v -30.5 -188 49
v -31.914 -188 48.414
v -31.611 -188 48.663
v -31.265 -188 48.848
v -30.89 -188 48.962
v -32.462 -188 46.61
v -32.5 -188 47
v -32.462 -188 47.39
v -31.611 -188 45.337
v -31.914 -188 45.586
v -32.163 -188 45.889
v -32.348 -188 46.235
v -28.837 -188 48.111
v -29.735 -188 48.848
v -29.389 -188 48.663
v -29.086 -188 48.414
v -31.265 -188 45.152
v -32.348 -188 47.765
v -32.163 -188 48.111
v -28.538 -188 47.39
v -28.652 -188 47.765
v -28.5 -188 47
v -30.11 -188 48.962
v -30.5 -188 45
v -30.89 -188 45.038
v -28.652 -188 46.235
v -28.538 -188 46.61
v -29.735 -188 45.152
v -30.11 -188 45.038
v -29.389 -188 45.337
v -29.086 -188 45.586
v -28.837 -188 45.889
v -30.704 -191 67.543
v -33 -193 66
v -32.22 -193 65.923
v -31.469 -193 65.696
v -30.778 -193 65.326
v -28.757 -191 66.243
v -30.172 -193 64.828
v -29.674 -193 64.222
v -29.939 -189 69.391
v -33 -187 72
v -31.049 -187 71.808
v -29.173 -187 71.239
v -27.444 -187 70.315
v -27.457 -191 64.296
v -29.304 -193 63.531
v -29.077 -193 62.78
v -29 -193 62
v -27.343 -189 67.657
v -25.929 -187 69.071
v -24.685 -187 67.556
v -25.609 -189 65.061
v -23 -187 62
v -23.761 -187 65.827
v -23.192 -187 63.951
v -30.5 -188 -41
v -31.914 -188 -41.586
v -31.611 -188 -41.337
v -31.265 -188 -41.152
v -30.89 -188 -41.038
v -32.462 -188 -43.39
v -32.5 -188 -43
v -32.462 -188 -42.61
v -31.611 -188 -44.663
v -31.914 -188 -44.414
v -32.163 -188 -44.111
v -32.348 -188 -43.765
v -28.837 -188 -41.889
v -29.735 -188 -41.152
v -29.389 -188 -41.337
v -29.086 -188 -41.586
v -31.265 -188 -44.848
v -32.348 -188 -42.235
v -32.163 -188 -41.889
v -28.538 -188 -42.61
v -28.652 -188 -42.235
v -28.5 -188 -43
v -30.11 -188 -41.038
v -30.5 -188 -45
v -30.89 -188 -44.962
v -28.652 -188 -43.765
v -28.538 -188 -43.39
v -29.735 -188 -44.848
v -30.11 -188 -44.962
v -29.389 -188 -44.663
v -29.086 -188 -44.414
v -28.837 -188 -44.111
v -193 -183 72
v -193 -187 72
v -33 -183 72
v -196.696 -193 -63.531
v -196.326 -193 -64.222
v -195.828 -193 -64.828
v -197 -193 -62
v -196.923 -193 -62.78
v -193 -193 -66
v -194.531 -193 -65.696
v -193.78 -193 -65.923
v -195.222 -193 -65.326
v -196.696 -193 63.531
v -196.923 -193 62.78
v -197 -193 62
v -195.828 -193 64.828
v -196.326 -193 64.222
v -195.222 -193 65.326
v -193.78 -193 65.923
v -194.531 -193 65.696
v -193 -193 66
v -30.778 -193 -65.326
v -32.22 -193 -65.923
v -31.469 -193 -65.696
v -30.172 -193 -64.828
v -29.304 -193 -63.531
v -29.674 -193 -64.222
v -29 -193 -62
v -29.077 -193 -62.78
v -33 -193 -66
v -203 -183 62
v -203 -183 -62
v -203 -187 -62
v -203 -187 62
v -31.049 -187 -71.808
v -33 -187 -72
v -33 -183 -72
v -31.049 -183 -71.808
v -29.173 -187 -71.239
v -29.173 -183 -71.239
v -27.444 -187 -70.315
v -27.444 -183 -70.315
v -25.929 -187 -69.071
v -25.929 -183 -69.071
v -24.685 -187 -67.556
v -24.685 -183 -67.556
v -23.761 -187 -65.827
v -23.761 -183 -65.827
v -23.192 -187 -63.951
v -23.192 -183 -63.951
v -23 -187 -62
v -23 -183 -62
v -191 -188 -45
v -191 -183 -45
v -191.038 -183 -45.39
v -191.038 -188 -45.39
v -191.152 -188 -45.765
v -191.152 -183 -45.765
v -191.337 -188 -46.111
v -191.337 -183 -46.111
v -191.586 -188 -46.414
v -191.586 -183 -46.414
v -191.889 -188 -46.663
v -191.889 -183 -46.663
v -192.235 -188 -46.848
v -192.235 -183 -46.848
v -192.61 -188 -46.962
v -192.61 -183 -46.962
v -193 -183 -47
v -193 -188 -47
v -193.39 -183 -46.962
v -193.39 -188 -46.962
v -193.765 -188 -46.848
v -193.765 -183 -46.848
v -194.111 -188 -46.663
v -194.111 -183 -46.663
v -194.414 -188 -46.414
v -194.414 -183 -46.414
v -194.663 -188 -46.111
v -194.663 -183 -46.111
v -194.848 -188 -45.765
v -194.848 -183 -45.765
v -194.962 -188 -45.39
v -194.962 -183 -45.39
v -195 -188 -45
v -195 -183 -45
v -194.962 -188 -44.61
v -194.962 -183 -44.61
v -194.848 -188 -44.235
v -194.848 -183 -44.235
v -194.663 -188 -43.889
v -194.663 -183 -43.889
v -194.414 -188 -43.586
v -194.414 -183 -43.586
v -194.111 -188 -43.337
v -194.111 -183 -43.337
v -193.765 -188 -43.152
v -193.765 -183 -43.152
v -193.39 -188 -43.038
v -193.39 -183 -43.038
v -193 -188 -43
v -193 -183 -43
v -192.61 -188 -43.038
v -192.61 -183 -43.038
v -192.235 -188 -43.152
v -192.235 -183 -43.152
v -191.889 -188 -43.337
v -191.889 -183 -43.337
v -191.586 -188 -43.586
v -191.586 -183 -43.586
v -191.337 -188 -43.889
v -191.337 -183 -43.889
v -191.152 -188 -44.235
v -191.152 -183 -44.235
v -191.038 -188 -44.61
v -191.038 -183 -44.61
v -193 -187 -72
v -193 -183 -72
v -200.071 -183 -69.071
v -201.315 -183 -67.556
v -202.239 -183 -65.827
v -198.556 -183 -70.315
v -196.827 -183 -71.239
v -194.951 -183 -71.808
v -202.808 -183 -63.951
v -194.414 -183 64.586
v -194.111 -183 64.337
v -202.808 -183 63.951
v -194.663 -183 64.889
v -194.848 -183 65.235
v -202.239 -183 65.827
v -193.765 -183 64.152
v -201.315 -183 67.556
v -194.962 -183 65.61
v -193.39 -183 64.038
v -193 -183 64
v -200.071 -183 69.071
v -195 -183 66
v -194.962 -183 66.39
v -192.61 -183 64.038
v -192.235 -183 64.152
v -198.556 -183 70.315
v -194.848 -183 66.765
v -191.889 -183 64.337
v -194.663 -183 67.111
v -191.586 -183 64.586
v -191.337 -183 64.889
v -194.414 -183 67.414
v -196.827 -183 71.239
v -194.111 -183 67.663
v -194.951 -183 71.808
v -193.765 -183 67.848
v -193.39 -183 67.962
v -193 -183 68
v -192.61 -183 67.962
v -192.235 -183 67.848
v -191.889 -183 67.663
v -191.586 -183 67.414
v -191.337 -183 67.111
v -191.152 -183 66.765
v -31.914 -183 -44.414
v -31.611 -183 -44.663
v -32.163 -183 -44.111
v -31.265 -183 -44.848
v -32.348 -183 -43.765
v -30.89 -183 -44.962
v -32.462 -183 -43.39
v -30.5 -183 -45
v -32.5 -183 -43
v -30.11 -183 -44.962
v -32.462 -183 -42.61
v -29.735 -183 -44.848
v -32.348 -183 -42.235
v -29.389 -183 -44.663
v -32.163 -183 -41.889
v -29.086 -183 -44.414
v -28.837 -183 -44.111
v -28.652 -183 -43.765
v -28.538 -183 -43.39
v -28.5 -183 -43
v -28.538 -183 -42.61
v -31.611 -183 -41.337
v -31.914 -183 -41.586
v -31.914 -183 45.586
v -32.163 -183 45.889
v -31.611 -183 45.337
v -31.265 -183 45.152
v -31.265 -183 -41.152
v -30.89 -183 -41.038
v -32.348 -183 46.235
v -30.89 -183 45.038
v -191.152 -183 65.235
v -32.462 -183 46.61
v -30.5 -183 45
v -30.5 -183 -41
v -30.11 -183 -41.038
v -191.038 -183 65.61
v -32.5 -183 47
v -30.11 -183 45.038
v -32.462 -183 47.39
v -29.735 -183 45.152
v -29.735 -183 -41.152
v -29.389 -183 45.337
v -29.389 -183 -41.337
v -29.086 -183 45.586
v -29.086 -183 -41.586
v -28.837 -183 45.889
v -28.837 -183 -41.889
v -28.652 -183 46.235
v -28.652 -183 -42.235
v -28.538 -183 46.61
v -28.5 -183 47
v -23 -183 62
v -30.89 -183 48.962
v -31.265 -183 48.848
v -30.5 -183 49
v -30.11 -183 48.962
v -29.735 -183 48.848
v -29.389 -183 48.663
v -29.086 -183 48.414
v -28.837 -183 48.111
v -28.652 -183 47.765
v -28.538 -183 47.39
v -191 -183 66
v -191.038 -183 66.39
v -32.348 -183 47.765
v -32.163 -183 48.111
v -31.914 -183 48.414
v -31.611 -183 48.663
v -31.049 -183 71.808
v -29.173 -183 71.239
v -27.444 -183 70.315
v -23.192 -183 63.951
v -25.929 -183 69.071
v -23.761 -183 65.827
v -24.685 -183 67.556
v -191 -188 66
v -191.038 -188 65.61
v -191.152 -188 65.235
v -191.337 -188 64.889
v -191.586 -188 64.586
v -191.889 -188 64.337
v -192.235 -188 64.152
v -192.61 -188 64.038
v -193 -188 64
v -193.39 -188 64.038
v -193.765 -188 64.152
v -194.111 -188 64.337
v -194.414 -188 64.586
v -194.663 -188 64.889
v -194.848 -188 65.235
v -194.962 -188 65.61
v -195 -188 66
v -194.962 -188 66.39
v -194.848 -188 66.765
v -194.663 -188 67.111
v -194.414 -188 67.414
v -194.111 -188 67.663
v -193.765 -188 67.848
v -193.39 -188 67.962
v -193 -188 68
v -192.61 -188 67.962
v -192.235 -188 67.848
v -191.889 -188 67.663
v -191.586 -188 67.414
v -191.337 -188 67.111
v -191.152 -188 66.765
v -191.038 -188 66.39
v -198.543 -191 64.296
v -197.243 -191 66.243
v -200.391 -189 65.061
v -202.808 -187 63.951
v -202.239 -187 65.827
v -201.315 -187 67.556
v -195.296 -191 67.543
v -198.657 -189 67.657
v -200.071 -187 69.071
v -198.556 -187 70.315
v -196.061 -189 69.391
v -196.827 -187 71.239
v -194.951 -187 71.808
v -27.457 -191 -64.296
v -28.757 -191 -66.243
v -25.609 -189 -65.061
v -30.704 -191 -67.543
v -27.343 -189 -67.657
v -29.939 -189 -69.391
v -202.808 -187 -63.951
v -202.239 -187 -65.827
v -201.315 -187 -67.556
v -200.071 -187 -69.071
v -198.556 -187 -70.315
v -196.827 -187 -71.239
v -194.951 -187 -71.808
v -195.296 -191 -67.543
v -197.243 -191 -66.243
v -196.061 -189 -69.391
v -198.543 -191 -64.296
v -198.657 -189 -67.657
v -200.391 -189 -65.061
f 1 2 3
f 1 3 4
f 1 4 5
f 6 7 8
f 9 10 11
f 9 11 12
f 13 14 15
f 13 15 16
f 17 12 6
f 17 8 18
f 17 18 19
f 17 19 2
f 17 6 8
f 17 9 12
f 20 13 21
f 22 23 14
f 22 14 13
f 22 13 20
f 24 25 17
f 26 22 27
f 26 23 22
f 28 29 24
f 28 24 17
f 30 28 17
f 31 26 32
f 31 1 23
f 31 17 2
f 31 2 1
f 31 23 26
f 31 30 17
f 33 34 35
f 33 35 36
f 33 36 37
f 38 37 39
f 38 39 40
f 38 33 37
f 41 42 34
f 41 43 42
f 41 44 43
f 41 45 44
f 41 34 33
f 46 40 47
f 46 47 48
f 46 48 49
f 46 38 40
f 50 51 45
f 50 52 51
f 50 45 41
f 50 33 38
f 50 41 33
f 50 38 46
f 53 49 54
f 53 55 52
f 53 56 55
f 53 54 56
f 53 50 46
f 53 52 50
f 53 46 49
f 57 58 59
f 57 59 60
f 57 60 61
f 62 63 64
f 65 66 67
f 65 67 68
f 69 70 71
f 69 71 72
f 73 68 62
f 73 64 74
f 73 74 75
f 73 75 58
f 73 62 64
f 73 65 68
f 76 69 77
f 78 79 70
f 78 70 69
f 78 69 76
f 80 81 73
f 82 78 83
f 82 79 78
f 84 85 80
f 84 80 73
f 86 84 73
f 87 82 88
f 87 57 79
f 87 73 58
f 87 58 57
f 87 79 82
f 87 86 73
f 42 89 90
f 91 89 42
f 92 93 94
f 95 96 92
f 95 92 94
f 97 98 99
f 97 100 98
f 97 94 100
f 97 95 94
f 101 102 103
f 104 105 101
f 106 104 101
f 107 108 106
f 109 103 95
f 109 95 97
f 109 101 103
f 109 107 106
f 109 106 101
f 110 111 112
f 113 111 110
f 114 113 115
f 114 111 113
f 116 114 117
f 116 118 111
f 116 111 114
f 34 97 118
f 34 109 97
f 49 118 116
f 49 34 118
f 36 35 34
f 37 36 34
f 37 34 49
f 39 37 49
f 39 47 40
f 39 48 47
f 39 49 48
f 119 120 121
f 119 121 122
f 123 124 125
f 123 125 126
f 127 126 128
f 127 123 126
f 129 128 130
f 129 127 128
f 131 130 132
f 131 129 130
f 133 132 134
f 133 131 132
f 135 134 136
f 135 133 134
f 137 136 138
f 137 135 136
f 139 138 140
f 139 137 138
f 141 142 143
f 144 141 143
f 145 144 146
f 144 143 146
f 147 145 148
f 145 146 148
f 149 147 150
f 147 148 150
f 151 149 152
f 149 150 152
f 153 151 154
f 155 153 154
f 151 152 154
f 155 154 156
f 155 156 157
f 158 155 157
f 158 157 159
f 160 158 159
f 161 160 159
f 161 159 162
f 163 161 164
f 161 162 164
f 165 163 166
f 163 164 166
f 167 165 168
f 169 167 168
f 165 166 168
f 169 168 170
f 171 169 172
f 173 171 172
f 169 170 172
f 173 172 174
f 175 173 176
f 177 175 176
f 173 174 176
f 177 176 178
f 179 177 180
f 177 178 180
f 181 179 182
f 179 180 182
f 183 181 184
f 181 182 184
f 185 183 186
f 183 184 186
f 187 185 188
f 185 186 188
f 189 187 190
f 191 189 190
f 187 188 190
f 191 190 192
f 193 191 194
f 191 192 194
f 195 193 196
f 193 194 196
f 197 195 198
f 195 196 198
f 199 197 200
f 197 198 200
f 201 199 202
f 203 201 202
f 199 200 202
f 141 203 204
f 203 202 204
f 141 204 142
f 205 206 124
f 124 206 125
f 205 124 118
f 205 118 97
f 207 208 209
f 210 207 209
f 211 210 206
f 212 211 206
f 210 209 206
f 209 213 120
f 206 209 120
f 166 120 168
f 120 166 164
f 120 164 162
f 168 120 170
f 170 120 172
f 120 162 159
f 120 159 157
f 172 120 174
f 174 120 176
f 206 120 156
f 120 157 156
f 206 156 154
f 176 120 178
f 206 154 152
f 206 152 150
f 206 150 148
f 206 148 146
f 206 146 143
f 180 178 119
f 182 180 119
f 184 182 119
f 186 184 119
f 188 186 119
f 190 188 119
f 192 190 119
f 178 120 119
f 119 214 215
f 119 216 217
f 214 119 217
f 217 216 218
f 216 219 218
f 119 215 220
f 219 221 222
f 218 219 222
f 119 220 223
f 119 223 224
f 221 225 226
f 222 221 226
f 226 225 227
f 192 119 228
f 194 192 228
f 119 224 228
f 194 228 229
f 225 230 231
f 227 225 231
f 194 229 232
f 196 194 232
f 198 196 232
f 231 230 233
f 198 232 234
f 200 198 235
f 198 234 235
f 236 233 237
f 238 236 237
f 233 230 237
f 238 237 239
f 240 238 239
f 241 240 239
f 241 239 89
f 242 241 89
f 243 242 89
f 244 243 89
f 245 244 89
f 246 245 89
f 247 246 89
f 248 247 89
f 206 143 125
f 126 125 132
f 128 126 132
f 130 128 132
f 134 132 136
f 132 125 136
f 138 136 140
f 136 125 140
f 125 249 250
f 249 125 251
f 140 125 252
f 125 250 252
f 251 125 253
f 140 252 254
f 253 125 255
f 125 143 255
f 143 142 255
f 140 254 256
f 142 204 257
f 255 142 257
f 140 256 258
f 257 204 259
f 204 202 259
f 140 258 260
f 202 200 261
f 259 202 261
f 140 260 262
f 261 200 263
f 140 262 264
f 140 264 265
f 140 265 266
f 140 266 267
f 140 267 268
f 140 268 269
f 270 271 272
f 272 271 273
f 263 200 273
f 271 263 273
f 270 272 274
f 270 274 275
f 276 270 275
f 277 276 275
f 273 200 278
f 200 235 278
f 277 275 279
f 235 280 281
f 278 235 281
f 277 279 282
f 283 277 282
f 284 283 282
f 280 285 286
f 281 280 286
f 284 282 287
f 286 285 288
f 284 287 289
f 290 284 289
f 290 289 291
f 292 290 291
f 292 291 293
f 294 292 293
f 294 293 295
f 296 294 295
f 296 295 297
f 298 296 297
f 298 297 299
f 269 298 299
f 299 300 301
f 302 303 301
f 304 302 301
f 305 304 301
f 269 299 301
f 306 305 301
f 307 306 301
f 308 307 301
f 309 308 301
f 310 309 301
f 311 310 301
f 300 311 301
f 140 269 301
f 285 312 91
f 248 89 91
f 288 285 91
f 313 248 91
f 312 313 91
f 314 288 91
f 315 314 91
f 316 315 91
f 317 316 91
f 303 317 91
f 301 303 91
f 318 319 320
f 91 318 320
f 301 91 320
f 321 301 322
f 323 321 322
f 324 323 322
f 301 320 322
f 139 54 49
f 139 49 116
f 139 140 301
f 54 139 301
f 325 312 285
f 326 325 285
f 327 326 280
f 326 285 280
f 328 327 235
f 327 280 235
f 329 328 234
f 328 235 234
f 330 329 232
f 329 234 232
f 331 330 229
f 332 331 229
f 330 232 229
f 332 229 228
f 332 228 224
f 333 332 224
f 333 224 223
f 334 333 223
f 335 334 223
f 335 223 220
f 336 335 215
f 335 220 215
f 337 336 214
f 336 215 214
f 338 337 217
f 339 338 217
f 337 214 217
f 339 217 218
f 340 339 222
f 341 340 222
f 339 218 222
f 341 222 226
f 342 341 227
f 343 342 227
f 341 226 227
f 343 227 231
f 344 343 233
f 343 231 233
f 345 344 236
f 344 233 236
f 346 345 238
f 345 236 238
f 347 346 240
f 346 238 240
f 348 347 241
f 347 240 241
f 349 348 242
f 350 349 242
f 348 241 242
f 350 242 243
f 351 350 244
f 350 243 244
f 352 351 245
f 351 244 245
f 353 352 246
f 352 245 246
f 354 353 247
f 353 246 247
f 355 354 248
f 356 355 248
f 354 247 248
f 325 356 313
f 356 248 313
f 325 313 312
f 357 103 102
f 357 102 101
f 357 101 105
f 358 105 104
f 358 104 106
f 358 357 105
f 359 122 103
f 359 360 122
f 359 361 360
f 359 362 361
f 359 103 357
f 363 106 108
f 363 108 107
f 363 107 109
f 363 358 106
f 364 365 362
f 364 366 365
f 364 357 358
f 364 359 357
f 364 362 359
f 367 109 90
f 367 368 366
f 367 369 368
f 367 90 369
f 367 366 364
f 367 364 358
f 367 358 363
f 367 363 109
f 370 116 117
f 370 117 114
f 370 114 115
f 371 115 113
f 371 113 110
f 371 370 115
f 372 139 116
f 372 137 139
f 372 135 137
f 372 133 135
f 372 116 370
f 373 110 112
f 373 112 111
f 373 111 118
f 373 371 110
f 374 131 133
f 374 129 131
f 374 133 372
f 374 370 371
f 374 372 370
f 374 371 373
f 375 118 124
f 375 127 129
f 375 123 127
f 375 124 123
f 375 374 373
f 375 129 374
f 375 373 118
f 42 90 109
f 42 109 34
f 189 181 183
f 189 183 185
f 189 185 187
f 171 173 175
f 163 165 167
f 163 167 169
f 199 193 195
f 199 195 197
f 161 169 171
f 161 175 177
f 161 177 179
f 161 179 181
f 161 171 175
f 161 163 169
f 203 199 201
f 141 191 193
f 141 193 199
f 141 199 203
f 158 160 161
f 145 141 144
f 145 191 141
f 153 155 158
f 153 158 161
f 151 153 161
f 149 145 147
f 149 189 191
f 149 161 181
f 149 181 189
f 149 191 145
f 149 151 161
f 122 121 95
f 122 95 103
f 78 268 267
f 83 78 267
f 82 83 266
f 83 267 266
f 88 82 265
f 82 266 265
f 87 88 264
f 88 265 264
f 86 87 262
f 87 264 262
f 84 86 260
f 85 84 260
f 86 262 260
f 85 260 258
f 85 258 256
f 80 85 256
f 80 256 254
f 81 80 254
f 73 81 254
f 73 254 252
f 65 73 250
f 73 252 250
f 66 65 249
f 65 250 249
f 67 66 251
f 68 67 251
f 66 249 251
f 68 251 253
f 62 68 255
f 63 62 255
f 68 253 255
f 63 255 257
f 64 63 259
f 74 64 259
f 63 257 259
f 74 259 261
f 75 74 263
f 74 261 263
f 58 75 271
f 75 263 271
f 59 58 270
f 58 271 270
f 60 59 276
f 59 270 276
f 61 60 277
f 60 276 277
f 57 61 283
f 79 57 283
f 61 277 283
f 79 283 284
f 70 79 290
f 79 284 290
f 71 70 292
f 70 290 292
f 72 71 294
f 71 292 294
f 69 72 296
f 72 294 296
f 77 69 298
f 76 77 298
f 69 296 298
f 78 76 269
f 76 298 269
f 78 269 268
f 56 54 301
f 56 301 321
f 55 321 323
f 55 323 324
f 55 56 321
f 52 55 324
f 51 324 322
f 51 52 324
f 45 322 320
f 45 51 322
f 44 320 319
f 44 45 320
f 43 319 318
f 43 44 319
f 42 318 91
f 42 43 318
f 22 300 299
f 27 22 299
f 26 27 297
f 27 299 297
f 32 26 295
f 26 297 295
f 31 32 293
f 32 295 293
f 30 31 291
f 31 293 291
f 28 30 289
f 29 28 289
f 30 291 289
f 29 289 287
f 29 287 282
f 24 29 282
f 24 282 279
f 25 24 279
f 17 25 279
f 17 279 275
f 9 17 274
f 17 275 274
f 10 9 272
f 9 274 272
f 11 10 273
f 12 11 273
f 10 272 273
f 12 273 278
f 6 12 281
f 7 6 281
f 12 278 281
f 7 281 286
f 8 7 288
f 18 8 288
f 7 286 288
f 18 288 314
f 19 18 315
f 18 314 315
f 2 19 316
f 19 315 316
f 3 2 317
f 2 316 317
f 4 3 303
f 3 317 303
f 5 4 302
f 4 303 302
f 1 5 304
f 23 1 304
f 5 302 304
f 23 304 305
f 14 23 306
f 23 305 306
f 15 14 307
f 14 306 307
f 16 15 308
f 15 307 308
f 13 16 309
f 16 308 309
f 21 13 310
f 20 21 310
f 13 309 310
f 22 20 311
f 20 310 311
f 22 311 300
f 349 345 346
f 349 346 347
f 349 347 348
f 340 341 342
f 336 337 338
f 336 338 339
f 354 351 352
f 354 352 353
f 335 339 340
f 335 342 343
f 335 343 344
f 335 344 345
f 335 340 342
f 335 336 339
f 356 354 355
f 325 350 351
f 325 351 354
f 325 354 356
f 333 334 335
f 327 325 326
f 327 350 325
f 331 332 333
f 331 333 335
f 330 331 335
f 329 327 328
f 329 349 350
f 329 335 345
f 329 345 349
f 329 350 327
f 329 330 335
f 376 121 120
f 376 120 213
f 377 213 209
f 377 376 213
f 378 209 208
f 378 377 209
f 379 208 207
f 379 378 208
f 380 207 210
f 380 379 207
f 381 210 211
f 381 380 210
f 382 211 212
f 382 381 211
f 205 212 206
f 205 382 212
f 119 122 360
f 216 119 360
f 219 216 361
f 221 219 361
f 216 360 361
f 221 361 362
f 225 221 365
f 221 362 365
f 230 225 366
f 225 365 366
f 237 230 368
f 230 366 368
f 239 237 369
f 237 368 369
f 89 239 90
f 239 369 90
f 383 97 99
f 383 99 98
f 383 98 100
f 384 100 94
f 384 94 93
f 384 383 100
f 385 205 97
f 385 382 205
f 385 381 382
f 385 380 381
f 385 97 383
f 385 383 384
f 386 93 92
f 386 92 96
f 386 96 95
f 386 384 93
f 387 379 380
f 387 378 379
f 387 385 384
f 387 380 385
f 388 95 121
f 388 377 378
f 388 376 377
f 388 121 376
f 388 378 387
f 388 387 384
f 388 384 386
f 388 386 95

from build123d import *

# Parameters (mm, degrees)
SKETCH170_W     = 180
SKETCH170_H     = 144
PAD047_DEPTH    = 10
FILLET026_R     = 10
CHAMFER012_SIZE = 6
SKETCH171_R     = 2
POCKET058_DEPTH = 5


with BuildPart() as part:
    # Sketch170 → Pad047 (new body)
    with BuildSketch(Plane.XZ):
        Rectangle(SKETCH170_W, SKETCH170_H)
    extrude(amount=PAD047_DEPTH)

    # Fillet026
    fillet026_edges = [part.edges().sort_by_distance(p)[0] for p in [
        (-90, -5, 72),
        (90, -5, 72),
        (90, -5, -72),
        (-90, -5, -72),
    ]]
    fillet(fillet026_edges, radius=FILLET026_R)

    # Chamfer012
    chamfer012_edges = [part.edges().sort_by_distance(p)[0] for p in [
        (0, -10, 72),
        (90, -10, 0),
        (0, -10, -72),
        (-90, -10, 0),
    ]]
    chamfer(chamfer012_edges, length=CHAMFER012_SIZE)

    # Sketch171 (on Face4 of Chamfer012) → Pocket058 (cut)
    with BuildSketch(Plane(origin=(0, 0, 0), x_dir=(1, 0, 0), z_dir=(0, 1, 0))):
        with Locations((-80, -66)):
            Circle(SKETCH171_R)
        with Locations((-80, 45)):
            Circle(SKETCH171_R)
        with Locations((82.5, 43)):
            Circle(SKETCH171_R)
        with Locations((82.5, -47)):
            Circle(SKETCH171_R)
    extrude(amount=-POCKET058_DEPTH, mode=Mode.SUBTRACT)


with BuildPart() as part_1:
    # Body017 placement: moved
    add(part.part.moved(Location((-113, -183, 0))))


solid = part_1.part
